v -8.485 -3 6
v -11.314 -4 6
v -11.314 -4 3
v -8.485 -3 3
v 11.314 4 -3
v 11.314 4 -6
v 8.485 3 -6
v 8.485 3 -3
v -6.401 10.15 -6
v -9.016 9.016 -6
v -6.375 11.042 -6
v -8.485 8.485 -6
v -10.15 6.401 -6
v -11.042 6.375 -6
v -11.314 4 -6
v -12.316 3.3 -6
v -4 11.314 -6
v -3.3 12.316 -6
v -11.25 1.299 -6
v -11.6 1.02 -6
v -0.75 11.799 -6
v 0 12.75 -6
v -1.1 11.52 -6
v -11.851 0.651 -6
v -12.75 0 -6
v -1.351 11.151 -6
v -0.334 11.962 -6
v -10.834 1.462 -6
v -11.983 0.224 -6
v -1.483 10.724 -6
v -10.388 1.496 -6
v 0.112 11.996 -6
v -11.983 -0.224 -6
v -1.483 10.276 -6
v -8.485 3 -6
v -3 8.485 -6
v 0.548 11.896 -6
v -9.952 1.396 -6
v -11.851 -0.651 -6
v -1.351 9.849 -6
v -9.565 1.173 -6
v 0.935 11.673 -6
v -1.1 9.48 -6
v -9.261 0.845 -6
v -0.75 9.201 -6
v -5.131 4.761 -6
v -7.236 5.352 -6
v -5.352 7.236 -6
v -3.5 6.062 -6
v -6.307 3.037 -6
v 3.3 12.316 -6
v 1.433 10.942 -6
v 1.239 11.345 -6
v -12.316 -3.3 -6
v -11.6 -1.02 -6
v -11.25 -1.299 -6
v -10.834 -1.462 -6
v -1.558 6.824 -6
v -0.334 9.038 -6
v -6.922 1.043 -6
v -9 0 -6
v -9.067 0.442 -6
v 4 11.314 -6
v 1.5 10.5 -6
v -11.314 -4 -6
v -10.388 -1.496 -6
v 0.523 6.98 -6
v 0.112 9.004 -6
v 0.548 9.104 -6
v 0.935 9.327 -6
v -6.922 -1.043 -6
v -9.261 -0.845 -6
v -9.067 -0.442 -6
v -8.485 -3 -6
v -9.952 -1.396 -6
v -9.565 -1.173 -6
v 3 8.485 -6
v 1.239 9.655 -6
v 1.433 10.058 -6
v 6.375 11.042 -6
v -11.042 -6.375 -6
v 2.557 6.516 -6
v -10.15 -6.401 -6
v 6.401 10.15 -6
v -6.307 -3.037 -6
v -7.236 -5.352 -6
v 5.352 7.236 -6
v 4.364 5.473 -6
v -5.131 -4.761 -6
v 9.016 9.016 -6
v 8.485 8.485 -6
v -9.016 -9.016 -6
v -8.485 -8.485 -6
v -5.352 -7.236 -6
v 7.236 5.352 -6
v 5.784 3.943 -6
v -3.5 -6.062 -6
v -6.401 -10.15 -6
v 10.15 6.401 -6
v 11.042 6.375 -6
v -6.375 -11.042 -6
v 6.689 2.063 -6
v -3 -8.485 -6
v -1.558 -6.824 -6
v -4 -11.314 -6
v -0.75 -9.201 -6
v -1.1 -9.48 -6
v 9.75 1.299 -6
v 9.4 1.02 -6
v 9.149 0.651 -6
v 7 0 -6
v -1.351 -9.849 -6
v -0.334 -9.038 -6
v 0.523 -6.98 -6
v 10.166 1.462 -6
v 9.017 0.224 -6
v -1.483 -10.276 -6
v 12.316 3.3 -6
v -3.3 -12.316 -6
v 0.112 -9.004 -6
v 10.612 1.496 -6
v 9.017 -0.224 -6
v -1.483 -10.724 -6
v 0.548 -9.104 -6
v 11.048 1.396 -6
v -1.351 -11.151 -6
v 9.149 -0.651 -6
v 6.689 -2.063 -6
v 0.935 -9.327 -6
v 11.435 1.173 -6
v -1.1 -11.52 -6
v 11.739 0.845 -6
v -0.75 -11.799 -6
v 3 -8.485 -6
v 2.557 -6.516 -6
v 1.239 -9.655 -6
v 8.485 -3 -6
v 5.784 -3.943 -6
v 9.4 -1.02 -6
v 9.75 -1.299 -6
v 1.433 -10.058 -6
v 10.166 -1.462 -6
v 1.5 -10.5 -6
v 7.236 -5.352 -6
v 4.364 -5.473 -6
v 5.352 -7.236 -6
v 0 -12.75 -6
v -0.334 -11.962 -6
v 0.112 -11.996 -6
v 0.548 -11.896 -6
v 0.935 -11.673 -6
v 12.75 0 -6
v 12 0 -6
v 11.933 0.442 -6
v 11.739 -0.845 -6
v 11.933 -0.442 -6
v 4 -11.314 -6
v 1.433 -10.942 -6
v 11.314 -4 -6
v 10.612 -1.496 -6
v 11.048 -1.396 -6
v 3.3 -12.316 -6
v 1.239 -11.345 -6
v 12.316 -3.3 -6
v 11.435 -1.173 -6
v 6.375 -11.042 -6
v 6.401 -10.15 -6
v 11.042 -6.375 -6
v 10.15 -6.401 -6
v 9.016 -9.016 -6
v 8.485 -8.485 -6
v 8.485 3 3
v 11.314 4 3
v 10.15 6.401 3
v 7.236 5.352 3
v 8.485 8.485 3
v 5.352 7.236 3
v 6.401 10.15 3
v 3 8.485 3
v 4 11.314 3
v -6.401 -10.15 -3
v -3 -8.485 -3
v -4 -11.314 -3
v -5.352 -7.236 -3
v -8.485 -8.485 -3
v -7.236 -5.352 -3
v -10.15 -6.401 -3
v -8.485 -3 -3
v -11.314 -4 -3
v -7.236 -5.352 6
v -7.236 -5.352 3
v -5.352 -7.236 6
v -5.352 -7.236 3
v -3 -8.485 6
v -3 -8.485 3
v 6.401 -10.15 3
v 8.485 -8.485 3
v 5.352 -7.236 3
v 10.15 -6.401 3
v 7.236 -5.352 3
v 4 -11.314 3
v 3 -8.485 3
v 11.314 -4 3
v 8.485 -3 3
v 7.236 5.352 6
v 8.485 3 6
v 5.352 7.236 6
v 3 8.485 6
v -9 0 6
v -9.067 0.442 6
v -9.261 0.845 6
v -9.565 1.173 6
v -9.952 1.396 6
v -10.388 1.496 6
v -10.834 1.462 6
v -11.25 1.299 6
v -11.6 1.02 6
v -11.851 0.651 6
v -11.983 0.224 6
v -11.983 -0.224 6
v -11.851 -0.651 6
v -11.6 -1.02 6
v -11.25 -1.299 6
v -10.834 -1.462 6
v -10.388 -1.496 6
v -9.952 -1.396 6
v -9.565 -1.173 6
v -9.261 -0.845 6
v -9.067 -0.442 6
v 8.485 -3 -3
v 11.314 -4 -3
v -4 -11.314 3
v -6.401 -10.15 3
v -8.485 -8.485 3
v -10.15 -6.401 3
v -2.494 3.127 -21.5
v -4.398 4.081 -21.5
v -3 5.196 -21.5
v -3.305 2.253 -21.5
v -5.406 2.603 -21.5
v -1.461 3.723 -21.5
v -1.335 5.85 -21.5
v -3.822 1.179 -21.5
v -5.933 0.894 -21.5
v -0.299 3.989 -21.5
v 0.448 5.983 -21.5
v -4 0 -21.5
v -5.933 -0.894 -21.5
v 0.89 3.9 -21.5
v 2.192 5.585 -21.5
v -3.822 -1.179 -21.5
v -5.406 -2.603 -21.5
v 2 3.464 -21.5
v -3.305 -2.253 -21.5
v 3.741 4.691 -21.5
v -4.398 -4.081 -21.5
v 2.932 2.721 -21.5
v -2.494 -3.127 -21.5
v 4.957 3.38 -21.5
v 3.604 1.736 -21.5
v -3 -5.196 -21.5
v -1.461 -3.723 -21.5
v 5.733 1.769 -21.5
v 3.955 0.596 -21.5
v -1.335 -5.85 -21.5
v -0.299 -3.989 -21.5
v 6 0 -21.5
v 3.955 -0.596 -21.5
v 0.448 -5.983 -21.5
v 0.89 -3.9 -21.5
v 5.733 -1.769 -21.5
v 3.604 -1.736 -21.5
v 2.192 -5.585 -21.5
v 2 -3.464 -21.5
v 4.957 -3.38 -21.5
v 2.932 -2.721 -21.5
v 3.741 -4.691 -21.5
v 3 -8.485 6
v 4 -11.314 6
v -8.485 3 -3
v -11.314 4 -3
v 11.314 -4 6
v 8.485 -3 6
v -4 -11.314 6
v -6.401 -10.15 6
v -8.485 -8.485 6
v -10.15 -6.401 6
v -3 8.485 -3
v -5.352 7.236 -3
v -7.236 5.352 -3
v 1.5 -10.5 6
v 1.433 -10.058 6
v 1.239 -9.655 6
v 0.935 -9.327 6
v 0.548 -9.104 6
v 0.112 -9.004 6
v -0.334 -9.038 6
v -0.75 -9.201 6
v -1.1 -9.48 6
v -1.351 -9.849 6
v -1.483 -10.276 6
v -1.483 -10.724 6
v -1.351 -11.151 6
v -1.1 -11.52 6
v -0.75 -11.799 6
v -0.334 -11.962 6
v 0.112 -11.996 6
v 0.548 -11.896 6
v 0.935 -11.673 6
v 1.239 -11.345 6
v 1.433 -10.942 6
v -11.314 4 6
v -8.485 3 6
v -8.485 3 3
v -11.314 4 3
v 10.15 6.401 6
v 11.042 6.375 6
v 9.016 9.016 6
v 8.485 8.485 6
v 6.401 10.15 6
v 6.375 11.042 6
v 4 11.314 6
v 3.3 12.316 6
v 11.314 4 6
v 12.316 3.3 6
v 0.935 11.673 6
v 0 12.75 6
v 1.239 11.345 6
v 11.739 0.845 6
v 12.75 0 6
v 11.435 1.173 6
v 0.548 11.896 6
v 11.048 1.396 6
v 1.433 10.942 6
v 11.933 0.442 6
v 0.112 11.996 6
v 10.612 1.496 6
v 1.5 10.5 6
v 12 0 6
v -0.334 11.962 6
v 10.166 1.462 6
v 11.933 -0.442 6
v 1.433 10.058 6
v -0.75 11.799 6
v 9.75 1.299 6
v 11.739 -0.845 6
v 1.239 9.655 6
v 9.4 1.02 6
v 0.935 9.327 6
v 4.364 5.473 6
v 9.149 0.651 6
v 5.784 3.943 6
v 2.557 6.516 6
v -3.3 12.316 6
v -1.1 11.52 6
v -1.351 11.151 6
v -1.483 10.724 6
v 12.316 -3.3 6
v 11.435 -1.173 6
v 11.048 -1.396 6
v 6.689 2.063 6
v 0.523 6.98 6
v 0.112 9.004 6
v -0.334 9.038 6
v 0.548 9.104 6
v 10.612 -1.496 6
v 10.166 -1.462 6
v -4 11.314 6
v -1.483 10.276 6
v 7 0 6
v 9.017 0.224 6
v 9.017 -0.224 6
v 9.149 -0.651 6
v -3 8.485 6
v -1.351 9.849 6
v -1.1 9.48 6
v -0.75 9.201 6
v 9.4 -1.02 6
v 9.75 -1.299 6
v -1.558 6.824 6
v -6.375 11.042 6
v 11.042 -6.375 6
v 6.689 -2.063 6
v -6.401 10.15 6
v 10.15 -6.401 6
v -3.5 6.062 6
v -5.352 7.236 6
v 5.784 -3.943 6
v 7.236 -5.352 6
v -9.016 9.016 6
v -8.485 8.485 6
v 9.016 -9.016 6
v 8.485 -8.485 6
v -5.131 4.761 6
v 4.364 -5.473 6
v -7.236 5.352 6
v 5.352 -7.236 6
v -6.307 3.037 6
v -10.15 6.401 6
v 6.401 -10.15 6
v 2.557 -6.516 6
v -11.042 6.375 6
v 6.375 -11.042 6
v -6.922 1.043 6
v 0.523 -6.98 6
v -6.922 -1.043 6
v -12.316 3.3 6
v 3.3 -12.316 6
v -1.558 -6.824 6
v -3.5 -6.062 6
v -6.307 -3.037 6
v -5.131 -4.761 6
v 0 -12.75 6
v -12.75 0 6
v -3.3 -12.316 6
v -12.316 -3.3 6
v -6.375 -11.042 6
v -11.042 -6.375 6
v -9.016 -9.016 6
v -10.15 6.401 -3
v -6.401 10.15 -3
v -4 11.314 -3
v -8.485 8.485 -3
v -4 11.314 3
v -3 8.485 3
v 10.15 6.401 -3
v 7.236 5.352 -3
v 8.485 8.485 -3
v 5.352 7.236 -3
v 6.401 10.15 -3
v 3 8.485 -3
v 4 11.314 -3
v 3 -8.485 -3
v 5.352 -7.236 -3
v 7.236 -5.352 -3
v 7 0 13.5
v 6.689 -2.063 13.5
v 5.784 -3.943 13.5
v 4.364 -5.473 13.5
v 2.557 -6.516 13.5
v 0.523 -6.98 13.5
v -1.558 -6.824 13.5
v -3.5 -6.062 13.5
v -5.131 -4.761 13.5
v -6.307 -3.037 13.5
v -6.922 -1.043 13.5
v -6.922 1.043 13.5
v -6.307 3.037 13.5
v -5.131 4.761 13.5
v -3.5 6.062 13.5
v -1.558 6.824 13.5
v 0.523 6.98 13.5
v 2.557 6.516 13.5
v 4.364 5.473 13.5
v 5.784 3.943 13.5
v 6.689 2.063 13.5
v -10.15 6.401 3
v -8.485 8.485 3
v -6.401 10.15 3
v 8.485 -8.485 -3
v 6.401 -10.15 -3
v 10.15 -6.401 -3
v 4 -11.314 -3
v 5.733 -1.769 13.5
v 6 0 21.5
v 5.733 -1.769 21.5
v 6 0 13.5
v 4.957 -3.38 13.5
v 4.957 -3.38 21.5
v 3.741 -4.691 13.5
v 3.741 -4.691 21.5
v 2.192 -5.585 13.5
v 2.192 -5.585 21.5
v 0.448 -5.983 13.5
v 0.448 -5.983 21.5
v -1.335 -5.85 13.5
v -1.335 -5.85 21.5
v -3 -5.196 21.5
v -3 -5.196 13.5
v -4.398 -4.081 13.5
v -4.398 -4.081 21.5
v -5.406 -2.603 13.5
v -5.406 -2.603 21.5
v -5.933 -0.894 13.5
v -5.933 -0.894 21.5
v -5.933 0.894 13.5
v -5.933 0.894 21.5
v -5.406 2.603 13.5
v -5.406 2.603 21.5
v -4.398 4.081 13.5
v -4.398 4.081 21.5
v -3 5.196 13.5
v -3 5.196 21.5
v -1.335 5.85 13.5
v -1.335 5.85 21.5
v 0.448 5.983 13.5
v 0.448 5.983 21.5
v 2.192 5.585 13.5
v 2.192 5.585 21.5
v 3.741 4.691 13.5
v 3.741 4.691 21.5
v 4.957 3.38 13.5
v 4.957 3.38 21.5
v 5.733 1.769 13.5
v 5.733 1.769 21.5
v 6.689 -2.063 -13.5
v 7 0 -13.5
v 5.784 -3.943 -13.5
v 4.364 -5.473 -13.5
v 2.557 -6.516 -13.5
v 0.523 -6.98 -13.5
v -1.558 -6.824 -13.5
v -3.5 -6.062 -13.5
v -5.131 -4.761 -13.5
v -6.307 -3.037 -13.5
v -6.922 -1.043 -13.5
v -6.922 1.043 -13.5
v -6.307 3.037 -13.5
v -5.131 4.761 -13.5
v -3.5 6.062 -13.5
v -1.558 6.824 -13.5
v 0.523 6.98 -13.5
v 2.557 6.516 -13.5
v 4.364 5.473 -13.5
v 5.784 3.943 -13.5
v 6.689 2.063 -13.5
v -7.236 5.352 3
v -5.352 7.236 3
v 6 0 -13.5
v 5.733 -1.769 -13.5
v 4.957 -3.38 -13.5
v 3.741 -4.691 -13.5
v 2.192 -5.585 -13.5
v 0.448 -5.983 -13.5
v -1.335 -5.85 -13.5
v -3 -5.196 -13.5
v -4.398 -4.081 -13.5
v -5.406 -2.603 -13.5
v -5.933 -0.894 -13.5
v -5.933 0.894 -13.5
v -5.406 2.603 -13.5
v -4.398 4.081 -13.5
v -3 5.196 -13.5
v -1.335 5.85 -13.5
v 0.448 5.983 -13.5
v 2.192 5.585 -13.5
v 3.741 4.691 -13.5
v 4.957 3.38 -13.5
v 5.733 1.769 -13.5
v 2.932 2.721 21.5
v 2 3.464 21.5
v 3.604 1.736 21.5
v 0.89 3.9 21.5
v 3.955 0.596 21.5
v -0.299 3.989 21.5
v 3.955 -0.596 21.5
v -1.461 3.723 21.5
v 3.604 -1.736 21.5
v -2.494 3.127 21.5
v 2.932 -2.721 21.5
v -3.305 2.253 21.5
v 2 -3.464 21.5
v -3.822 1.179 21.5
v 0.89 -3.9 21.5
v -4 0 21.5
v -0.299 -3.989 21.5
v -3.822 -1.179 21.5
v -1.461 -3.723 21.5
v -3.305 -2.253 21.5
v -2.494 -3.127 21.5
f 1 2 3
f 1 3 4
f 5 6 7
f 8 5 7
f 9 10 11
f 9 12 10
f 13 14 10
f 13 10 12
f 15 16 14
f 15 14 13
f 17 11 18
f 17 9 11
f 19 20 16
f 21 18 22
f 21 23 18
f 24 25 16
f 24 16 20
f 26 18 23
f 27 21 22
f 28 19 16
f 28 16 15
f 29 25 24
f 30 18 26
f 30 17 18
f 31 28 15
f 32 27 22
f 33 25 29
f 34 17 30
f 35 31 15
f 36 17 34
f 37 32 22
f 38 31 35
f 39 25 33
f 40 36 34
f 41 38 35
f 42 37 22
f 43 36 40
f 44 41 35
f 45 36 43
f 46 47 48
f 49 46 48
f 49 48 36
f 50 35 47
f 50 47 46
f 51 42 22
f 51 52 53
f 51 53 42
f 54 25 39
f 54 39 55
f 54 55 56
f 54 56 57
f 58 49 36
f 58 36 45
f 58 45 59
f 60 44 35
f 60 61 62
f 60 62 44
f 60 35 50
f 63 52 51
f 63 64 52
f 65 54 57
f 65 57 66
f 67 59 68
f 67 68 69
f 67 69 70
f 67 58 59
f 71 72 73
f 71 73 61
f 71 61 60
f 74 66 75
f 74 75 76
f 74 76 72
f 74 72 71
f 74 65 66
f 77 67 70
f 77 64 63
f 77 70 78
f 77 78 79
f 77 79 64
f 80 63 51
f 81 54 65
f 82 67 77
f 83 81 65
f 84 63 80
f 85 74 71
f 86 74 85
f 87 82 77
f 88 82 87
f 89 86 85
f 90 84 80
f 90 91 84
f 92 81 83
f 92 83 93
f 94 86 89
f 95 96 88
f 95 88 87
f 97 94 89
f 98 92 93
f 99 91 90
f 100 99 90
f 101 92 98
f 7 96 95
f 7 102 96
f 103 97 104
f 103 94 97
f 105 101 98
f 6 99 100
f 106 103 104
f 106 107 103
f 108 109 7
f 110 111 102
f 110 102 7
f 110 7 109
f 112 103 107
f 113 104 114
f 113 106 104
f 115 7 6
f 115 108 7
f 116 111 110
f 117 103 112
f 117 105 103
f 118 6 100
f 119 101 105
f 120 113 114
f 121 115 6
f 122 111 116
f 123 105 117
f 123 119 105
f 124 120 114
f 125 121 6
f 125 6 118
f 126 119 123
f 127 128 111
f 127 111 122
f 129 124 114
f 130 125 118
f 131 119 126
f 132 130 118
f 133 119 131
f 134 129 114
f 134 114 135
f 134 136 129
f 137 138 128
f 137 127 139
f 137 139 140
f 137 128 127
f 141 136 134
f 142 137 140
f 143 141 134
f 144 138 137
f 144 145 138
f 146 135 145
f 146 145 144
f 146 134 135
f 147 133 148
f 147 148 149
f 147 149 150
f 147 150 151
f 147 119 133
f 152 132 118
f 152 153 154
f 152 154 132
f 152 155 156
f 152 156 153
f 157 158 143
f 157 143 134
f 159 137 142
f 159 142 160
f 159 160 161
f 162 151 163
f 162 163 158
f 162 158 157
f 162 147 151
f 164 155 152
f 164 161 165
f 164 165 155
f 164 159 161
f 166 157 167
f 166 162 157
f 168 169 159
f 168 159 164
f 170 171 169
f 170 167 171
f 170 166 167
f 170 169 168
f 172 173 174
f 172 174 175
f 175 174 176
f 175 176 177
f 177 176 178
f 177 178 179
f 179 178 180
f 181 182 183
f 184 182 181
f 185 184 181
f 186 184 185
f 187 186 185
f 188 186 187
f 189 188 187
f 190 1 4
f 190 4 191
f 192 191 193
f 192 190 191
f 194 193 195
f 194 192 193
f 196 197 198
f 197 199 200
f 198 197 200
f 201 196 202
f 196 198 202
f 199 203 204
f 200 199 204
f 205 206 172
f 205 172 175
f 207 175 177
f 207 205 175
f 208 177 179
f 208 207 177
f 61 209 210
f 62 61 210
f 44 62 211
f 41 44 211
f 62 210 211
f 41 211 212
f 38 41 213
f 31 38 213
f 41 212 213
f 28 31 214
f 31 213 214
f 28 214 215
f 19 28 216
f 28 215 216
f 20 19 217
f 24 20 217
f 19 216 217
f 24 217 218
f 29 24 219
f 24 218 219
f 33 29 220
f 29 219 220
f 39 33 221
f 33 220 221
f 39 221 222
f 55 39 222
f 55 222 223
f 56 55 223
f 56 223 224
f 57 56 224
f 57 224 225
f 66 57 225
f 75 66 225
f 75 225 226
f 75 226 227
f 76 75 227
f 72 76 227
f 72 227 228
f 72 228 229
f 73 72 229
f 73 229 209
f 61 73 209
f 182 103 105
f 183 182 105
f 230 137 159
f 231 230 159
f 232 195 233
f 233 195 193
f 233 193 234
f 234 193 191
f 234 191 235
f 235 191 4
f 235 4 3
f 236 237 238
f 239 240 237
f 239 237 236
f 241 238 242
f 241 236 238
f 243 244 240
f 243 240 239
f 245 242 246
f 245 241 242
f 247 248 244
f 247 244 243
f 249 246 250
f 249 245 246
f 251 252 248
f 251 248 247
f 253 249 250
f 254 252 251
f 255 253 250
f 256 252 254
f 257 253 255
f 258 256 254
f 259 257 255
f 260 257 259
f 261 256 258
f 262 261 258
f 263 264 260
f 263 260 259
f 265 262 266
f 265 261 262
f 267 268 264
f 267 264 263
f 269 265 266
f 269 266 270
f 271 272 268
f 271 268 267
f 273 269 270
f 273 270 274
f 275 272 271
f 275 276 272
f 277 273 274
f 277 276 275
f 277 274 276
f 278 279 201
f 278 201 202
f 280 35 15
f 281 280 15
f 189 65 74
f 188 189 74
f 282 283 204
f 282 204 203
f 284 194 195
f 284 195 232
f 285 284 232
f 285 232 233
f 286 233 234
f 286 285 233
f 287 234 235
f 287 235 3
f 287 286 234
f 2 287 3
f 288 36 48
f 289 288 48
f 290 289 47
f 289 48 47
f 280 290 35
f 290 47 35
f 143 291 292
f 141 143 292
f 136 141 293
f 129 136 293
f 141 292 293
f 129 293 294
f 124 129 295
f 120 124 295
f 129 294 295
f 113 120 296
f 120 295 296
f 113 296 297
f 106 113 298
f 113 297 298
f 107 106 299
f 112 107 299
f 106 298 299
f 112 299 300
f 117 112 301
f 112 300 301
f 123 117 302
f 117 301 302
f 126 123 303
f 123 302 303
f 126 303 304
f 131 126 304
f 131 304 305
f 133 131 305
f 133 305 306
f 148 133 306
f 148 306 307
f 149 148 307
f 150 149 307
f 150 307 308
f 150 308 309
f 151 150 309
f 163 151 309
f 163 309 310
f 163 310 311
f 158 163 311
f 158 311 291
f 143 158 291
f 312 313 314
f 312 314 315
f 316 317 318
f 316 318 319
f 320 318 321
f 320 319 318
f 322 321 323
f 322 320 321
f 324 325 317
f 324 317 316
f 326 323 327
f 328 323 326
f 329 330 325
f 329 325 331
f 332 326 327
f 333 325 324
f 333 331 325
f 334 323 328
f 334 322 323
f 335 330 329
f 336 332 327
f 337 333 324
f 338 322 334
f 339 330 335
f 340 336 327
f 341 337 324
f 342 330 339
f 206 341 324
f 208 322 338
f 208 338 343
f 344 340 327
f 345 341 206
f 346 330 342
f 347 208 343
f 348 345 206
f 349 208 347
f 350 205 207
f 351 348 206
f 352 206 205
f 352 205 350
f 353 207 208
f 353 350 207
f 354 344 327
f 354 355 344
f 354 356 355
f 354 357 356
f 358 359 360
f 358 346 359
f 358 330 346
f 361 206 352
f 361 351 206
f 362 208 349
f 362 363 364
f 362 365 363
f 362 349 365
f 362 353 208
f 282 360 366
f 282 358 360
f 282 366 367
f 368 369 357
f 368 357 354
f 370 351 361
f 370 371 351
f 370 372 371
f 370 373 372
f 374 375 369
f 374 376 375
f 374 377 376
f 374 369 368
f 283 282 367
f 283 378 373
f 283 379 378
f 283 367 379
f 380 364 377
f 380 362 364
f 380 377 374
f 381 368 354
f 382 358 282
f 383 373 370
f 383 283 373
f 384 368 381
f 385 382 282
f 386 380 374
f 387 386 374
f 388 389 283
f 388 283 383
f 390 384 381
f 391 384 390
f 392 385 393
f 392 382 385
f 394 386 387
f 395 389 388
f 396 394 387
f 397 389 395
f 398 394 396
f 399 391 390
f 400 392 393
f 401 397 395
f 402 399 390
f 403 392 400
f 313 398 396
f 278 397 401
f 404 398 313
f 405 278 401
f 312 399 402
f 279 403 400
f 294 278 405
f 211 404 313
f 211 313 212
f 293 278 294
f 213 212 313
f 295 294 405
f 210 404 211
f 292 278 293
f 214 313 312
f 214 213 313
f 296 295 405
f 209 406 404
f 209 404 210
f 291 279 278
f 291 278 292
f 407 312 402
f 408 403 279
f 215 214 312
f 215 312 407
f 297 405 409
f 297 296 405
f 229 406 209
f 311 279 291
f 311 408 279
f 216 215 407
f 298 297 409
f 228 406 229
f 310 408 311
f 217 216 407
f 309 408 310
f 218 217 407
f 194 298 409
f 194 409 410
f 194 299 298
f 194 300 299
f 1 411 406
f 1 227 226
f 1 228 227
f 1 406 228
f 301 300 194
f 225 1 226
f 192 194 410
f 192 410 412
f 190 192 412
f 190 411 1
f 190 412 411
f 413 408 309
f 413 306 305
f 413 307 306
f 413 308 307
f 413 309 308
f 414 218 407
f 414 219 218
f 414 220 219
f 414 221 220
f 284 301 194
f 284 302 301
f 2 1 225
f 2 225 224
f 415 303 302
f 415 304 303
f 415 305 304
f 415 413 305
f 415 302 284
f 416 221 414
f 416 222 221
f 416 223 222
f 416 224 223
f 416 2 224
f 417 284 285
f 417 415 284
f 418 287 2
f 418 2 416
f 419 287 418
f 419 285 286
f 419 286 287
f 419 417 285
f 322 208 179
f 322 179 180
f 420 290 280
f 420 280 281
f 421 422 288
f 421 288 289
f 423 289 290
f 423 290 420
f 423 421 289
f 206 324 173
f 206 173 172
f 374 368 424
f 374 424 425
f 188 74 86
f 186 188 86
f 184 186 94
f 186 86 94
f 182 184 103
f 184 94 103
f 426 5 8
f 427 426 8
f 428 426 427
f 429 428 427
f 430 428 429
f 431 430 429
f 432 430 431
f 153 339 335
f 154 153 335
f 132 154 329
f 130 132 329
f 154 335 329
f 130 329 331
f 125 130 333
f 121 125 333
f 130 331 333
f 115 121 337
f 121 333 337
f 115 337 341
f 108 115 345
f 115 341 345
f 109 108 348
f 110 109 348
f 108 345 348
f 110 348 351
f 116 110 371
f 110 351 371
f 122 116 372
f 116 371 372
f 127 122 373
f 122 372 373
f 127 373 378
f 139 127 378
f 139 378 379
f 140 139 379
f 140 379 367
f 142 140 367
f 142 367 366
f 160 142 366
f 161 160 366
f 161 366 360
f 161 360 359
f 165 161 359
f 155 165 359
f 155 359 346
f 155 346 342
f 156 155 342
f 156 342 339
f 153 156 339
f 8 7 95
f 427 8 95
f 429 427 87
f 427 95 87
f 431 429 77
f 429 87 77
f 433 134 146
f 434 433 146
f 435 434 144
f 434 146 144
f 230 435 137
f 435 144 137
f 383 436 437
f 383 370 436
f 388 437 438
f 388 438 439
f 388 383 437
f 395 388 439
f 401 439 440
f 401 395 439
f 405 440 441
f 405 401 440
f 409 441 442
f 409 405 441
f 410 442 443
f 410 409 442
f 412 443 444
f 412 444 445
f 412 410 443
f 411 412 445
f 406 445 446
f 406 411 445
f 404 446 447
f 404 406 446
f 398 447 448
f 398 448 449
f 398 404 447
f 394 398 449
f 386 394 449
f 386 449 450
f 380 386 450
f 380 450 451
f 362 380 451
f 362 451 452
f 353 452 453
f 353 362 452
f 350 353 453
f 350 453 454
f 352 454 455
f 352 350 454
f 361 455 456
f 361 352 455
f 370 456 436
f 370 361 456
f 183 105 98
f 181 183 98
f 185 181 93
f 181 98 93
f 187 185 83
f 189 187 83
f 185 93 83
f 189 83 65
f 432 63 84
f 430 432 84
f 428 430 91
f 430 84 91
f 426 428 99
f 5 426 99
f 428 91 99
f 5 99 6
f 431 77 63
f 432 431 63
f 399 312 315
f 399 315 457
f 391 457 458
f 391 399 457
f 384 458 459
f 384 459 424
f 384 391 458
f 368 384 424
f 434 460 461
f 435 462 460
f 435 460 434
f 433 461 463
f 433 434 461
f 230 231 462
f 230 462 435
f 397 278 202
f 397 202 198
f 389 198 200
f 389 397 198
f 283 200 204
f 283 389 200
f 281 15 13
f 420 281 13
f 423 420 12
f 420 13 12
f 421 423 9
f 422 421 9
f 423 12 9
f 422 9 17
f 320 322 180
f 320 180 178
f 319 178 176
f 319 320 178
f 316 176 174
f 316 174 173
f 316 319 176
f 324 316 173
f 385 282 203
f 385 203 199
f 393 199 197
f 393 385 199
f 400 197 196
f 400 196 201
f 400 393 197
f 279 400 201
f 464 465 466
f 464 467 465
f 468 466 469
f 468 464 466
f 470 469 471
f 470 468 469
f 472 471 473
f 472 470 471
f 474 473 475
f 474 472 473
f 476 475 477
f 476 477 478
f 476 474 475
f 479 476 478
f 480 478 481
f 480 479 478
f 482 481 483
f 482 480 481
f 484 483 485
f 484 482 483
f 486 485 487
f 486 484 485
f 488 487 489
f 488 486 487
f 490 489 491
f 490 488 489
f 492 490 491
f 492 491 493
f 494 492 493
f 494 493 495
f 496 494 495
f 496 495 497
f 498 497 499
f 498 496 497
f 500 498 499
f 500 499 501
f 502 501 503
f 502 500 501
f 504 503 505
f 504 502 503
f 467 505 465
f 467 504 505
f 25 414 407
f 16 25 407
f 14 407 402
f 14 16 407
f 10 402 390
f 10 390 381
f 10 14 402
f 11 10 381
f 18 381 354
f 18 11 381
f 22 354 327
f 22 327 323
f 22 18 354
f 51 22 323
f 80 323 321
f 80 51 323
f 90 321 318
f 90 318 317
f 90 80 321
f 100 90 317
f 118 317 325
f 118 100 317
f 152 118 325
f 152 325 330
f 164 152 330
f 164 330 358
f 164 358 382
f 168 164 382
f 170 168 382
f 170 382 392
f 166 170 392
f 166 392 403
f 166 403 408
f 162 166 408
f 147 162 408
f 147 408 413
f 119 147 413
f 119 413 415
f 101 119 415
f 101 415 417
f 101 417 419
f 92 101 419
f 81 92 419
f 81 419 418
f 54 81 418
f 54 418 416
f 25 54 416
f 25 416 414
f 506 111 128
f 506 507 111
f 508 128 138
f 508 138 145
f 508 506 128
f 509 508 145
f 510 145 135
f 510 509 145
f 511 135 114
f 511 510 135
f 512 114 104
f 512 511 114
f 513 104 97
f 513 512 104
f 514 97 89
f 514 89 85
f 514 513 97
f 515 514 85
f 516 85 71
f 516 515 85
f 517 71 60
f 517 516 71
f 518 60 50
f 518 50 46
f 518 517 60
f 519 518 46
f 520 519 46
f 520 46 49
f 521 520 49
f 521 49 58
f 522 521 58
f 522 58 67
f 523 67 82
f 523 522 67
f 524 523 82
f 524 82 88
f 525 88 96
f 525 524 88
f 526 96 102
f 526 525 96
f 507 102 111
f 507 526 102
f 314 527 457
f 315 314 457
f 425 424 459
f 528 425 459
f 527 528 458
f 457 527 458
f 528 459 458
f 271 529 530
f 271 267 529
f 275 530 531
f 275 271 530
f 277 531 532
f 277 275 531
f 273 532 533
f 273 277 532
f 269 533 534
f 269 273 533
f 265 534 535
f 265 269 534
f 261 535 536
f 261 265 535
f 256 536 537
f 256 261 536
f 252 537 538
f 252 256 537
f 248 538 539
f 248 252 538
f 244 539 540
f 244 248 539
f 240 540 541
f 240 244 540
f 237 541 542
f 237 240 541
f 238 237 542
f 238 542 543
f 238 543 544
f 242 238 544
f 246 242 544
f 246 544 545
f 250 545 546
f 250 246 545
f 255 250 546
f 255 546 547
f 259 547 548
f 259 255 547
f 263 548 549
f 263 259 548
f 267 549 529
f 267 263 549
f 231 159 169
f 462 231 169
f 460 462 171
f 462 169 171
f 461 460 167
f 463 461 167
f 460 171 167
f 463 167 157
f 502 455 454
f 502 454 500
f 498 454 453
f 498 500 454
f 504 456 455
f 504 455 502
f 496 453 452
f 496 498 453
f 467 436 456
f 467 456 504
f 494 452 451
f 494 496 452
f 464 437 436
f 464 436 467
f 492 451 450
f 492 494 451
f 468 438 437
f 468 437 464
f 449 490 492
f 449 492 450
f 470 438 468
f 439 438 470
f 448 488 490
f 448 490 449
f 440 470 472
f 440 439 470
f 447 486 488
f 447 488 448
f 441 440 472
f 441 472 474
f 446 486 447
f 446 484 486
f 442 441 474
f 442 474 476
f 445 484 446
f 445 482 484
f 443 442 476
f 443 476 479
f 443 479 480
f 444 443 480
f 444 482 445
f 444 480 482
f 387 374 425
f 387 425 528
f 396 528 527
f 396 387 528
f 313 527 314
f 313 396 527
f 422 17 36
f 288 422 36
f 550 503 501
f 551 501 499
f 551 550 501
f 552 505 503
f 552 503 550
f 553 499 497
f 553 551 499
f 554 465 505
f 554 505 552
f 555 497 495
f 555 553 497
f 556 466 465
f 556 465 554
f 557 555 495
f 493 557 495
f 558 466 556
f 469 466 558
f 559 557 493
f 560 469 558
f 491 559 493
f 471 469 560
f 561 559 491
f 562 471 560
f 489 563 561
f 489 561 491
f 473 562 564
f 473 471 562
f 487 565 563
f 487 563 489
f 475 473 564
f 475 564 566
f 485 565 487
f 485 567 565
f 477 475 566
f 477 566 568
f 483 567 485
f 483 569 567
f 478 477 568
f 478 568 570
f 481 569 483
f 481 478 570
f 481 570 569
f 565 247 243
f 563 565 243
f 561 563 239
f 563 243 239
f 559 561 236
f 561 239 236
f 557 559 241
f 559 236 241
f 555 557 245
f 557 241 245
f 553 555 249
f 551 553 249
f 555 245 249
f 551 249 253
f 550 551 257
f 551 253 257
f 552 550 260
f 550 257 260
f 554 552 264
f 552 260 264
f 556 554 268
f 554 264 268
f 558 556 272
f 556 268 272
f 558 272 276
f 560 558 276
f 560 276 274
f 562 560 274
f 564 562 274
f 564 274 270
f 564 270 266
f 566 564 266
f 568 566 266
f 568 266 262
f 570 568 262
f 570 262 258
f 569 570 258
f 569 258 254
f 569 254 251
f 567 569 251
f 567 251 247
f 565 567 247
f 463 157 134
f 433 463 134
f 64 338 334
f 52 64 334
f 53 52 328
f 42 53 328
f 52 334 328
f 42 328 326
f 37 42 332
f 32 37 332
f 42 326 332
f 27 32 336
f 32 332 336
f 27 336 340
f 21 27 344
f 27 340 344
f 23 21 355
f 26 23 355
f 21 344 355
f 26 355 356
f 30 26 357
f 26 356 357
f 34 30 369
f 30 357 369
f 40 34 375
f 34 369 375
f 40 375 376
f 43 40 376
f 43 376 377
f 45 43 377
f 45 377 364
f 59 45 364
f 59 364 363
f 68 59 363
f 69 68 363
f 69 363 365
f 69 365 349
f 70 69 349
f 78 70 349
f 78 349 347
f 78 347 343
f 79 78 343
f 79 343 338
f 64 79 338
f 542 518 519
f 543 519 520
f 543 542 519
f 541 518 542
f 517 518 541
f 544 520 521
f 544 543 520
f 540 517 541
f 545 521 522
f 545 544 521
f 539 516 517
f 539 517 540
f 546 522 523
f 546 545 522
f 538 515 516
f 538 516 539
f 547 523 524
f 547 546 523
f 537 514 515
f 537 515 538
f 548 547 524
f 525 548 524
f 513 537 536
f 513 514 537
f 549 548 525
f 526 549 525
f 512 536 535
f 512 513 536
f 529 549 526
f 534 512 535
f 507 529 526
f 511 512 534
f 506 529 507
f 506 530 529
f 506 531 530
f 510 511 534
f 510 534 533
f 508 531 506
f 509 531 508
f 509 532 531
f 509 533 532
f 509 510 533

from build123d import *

# Parameters (mm, degrees)
SKETCH_2_R          = 1.5
CUT_EXTRUDE_1_DEPTH = 34.88583775
SKETCH_4_R          = 14
SKETCH_4_R_2        = 12.75
CUT_EXTRUDE_4_DEPTH = 34.88583775
CUT_EXTRUDE_5_DEPTH = 3
SKETCH_6_R          = 4
CUT_EXTRUDE_6_DEPTH = 47.627513337


with BuildPart() as part:
    # 草图1 → 旋转1 (revolve)
    with BuildSketch(Plane(origin=(0, 0, 0), x_dir=(0, 0, -1), z_dir=(1, 0, 0)), mode=Mode.PRIVATE) as revolve_1_sk:
        Polygon((-21.5, 0), (-21.5, 6), (-13.5, 6), (-13.5, 7), (-6, 7), (-6, 14), (6, 14), (6, 7), (13.5, 7), (13.5, 6), (21.5, 6), (21.5, 0), align=None)
    revolve(revolve_1_sk.sketch.rotate(Axis((0, 0, 21.5), (0, 0, -1)), 90), axis=Axis((0, 0, 21.5), (0, 0, -1)))

    # 草图2 → 切除-拉伸1 (cut, through all)
    with BuildSketch(Plane.XY.offset(6)):
        with Locations((0, 10.5)):
            Circle(SKETCH_2_R)
        with Locations((10.5, 0)):
            Circle(SKETCH_2_R)
        with Locations((0, -10.5)):
            Circle(SKETCH_2_R)
        with Locations((-10.5, 0)):
            Circle(SKETCH_2_R)
    extrude(amount=-CUT_EXTRUDE_1_DEPTH, mode=Mode.SUBTRACT)

    # 草图4 → 切除-拉伸4 (cut, through all)
    with BuildSketch(Plane(origin=(0, 0, -6), x_dir=(-1, 0, 0), z_dir=(0, 0, -1))):
        Circle(SKETCH_4_R)
        Circle(SKETCH_4_R_2, mode=Mode.SUBTRACT)
    extrude(amount=-CUT_EXTRUDE_4_DEPTH, mode=Mode.SUBTRACT)

    # 草图5 → 切除-拉伸5 (cut)
    with BuildSketch(Plane(origin=(0, 0, -6), x_dir=(-1, 0, 0), z_dir=(0, 0, -1))):
        with BuildLine():
            Line((-11.313708499, 4), (-8.485281374, 3))
            ThreePointArc((-8.485281374, 3), (-6.363961031, 6.363961031), (-3, 8.485281374))
            Line((-3, 8.485281374), (-4, 11.313708499))
            ThreePointArc((-4, 11.313708499), (-8.485281374, 8.485281374), (-11.313708499, 4))
        make_face()
        with BuildLine():
            Line((4, 11.313708499), (3, 8.485281374))
            ThreePointArc((3, 8.485281374), (6.363961031, 6.363961031), (8.485281374, 3))
            Line((8.485281374, 3), (11.313708499, 4))
            ThreePointArc((11.313708499, 4), (8.485281374, 8.485281374), (4, 11.313708499))
        make_face()
        with BuildLine():
            Line((11.313708499, -4), (8.485281374, -3))
            ThreePointArc((8.485281374, -3), (6.363961031, -6.363961031), (3, -8.485281374))
            Line((3, -8.485281374), (4, -11.313708499))
            ThreePointArc((4, -11.313708499), (8.485281374, -8.485281374), (11.313708499, -4))
        make_face()
        with BuildLine():
            Line((-4, -11.313708499), (-3, -8.485281374))
            ThreePointArc((-3, -8.485281374), (-6.363961031, -6.363961031), (-8.485281374, -3))
            Line((-8.485281374, -3), (-11.313708499, -4))
            ThreePointArc((-11.313708499, -4), (-8.485281374, -8.485281374), (-4, -11.313708499))
        make_face()
    cut_extrude_5 = extrude(amount=-CUT_EXTRUDE_5_DEPTH, mode=Mode.SUBTRACT)

    # 镜向2: 切除-拉伸5 across plane
    add(cut_extrude_5.mirror(Plane.XY), mode=Mode.SUBTRACT)

    # 草图6 → 切除-拉伸6 (cut, through all)
    with BuildSketch(Plane(origin=(0, 0, -21.5), x_dir=(-1, 0, 0), z_dir=(0, 0, -1))):
        Circle(SKETCH_6_R)
    extrude(amount=-CUT_EXTRUDE_6_DEPTH, mode=Mode.SUBTRACT)


solid = part.part
